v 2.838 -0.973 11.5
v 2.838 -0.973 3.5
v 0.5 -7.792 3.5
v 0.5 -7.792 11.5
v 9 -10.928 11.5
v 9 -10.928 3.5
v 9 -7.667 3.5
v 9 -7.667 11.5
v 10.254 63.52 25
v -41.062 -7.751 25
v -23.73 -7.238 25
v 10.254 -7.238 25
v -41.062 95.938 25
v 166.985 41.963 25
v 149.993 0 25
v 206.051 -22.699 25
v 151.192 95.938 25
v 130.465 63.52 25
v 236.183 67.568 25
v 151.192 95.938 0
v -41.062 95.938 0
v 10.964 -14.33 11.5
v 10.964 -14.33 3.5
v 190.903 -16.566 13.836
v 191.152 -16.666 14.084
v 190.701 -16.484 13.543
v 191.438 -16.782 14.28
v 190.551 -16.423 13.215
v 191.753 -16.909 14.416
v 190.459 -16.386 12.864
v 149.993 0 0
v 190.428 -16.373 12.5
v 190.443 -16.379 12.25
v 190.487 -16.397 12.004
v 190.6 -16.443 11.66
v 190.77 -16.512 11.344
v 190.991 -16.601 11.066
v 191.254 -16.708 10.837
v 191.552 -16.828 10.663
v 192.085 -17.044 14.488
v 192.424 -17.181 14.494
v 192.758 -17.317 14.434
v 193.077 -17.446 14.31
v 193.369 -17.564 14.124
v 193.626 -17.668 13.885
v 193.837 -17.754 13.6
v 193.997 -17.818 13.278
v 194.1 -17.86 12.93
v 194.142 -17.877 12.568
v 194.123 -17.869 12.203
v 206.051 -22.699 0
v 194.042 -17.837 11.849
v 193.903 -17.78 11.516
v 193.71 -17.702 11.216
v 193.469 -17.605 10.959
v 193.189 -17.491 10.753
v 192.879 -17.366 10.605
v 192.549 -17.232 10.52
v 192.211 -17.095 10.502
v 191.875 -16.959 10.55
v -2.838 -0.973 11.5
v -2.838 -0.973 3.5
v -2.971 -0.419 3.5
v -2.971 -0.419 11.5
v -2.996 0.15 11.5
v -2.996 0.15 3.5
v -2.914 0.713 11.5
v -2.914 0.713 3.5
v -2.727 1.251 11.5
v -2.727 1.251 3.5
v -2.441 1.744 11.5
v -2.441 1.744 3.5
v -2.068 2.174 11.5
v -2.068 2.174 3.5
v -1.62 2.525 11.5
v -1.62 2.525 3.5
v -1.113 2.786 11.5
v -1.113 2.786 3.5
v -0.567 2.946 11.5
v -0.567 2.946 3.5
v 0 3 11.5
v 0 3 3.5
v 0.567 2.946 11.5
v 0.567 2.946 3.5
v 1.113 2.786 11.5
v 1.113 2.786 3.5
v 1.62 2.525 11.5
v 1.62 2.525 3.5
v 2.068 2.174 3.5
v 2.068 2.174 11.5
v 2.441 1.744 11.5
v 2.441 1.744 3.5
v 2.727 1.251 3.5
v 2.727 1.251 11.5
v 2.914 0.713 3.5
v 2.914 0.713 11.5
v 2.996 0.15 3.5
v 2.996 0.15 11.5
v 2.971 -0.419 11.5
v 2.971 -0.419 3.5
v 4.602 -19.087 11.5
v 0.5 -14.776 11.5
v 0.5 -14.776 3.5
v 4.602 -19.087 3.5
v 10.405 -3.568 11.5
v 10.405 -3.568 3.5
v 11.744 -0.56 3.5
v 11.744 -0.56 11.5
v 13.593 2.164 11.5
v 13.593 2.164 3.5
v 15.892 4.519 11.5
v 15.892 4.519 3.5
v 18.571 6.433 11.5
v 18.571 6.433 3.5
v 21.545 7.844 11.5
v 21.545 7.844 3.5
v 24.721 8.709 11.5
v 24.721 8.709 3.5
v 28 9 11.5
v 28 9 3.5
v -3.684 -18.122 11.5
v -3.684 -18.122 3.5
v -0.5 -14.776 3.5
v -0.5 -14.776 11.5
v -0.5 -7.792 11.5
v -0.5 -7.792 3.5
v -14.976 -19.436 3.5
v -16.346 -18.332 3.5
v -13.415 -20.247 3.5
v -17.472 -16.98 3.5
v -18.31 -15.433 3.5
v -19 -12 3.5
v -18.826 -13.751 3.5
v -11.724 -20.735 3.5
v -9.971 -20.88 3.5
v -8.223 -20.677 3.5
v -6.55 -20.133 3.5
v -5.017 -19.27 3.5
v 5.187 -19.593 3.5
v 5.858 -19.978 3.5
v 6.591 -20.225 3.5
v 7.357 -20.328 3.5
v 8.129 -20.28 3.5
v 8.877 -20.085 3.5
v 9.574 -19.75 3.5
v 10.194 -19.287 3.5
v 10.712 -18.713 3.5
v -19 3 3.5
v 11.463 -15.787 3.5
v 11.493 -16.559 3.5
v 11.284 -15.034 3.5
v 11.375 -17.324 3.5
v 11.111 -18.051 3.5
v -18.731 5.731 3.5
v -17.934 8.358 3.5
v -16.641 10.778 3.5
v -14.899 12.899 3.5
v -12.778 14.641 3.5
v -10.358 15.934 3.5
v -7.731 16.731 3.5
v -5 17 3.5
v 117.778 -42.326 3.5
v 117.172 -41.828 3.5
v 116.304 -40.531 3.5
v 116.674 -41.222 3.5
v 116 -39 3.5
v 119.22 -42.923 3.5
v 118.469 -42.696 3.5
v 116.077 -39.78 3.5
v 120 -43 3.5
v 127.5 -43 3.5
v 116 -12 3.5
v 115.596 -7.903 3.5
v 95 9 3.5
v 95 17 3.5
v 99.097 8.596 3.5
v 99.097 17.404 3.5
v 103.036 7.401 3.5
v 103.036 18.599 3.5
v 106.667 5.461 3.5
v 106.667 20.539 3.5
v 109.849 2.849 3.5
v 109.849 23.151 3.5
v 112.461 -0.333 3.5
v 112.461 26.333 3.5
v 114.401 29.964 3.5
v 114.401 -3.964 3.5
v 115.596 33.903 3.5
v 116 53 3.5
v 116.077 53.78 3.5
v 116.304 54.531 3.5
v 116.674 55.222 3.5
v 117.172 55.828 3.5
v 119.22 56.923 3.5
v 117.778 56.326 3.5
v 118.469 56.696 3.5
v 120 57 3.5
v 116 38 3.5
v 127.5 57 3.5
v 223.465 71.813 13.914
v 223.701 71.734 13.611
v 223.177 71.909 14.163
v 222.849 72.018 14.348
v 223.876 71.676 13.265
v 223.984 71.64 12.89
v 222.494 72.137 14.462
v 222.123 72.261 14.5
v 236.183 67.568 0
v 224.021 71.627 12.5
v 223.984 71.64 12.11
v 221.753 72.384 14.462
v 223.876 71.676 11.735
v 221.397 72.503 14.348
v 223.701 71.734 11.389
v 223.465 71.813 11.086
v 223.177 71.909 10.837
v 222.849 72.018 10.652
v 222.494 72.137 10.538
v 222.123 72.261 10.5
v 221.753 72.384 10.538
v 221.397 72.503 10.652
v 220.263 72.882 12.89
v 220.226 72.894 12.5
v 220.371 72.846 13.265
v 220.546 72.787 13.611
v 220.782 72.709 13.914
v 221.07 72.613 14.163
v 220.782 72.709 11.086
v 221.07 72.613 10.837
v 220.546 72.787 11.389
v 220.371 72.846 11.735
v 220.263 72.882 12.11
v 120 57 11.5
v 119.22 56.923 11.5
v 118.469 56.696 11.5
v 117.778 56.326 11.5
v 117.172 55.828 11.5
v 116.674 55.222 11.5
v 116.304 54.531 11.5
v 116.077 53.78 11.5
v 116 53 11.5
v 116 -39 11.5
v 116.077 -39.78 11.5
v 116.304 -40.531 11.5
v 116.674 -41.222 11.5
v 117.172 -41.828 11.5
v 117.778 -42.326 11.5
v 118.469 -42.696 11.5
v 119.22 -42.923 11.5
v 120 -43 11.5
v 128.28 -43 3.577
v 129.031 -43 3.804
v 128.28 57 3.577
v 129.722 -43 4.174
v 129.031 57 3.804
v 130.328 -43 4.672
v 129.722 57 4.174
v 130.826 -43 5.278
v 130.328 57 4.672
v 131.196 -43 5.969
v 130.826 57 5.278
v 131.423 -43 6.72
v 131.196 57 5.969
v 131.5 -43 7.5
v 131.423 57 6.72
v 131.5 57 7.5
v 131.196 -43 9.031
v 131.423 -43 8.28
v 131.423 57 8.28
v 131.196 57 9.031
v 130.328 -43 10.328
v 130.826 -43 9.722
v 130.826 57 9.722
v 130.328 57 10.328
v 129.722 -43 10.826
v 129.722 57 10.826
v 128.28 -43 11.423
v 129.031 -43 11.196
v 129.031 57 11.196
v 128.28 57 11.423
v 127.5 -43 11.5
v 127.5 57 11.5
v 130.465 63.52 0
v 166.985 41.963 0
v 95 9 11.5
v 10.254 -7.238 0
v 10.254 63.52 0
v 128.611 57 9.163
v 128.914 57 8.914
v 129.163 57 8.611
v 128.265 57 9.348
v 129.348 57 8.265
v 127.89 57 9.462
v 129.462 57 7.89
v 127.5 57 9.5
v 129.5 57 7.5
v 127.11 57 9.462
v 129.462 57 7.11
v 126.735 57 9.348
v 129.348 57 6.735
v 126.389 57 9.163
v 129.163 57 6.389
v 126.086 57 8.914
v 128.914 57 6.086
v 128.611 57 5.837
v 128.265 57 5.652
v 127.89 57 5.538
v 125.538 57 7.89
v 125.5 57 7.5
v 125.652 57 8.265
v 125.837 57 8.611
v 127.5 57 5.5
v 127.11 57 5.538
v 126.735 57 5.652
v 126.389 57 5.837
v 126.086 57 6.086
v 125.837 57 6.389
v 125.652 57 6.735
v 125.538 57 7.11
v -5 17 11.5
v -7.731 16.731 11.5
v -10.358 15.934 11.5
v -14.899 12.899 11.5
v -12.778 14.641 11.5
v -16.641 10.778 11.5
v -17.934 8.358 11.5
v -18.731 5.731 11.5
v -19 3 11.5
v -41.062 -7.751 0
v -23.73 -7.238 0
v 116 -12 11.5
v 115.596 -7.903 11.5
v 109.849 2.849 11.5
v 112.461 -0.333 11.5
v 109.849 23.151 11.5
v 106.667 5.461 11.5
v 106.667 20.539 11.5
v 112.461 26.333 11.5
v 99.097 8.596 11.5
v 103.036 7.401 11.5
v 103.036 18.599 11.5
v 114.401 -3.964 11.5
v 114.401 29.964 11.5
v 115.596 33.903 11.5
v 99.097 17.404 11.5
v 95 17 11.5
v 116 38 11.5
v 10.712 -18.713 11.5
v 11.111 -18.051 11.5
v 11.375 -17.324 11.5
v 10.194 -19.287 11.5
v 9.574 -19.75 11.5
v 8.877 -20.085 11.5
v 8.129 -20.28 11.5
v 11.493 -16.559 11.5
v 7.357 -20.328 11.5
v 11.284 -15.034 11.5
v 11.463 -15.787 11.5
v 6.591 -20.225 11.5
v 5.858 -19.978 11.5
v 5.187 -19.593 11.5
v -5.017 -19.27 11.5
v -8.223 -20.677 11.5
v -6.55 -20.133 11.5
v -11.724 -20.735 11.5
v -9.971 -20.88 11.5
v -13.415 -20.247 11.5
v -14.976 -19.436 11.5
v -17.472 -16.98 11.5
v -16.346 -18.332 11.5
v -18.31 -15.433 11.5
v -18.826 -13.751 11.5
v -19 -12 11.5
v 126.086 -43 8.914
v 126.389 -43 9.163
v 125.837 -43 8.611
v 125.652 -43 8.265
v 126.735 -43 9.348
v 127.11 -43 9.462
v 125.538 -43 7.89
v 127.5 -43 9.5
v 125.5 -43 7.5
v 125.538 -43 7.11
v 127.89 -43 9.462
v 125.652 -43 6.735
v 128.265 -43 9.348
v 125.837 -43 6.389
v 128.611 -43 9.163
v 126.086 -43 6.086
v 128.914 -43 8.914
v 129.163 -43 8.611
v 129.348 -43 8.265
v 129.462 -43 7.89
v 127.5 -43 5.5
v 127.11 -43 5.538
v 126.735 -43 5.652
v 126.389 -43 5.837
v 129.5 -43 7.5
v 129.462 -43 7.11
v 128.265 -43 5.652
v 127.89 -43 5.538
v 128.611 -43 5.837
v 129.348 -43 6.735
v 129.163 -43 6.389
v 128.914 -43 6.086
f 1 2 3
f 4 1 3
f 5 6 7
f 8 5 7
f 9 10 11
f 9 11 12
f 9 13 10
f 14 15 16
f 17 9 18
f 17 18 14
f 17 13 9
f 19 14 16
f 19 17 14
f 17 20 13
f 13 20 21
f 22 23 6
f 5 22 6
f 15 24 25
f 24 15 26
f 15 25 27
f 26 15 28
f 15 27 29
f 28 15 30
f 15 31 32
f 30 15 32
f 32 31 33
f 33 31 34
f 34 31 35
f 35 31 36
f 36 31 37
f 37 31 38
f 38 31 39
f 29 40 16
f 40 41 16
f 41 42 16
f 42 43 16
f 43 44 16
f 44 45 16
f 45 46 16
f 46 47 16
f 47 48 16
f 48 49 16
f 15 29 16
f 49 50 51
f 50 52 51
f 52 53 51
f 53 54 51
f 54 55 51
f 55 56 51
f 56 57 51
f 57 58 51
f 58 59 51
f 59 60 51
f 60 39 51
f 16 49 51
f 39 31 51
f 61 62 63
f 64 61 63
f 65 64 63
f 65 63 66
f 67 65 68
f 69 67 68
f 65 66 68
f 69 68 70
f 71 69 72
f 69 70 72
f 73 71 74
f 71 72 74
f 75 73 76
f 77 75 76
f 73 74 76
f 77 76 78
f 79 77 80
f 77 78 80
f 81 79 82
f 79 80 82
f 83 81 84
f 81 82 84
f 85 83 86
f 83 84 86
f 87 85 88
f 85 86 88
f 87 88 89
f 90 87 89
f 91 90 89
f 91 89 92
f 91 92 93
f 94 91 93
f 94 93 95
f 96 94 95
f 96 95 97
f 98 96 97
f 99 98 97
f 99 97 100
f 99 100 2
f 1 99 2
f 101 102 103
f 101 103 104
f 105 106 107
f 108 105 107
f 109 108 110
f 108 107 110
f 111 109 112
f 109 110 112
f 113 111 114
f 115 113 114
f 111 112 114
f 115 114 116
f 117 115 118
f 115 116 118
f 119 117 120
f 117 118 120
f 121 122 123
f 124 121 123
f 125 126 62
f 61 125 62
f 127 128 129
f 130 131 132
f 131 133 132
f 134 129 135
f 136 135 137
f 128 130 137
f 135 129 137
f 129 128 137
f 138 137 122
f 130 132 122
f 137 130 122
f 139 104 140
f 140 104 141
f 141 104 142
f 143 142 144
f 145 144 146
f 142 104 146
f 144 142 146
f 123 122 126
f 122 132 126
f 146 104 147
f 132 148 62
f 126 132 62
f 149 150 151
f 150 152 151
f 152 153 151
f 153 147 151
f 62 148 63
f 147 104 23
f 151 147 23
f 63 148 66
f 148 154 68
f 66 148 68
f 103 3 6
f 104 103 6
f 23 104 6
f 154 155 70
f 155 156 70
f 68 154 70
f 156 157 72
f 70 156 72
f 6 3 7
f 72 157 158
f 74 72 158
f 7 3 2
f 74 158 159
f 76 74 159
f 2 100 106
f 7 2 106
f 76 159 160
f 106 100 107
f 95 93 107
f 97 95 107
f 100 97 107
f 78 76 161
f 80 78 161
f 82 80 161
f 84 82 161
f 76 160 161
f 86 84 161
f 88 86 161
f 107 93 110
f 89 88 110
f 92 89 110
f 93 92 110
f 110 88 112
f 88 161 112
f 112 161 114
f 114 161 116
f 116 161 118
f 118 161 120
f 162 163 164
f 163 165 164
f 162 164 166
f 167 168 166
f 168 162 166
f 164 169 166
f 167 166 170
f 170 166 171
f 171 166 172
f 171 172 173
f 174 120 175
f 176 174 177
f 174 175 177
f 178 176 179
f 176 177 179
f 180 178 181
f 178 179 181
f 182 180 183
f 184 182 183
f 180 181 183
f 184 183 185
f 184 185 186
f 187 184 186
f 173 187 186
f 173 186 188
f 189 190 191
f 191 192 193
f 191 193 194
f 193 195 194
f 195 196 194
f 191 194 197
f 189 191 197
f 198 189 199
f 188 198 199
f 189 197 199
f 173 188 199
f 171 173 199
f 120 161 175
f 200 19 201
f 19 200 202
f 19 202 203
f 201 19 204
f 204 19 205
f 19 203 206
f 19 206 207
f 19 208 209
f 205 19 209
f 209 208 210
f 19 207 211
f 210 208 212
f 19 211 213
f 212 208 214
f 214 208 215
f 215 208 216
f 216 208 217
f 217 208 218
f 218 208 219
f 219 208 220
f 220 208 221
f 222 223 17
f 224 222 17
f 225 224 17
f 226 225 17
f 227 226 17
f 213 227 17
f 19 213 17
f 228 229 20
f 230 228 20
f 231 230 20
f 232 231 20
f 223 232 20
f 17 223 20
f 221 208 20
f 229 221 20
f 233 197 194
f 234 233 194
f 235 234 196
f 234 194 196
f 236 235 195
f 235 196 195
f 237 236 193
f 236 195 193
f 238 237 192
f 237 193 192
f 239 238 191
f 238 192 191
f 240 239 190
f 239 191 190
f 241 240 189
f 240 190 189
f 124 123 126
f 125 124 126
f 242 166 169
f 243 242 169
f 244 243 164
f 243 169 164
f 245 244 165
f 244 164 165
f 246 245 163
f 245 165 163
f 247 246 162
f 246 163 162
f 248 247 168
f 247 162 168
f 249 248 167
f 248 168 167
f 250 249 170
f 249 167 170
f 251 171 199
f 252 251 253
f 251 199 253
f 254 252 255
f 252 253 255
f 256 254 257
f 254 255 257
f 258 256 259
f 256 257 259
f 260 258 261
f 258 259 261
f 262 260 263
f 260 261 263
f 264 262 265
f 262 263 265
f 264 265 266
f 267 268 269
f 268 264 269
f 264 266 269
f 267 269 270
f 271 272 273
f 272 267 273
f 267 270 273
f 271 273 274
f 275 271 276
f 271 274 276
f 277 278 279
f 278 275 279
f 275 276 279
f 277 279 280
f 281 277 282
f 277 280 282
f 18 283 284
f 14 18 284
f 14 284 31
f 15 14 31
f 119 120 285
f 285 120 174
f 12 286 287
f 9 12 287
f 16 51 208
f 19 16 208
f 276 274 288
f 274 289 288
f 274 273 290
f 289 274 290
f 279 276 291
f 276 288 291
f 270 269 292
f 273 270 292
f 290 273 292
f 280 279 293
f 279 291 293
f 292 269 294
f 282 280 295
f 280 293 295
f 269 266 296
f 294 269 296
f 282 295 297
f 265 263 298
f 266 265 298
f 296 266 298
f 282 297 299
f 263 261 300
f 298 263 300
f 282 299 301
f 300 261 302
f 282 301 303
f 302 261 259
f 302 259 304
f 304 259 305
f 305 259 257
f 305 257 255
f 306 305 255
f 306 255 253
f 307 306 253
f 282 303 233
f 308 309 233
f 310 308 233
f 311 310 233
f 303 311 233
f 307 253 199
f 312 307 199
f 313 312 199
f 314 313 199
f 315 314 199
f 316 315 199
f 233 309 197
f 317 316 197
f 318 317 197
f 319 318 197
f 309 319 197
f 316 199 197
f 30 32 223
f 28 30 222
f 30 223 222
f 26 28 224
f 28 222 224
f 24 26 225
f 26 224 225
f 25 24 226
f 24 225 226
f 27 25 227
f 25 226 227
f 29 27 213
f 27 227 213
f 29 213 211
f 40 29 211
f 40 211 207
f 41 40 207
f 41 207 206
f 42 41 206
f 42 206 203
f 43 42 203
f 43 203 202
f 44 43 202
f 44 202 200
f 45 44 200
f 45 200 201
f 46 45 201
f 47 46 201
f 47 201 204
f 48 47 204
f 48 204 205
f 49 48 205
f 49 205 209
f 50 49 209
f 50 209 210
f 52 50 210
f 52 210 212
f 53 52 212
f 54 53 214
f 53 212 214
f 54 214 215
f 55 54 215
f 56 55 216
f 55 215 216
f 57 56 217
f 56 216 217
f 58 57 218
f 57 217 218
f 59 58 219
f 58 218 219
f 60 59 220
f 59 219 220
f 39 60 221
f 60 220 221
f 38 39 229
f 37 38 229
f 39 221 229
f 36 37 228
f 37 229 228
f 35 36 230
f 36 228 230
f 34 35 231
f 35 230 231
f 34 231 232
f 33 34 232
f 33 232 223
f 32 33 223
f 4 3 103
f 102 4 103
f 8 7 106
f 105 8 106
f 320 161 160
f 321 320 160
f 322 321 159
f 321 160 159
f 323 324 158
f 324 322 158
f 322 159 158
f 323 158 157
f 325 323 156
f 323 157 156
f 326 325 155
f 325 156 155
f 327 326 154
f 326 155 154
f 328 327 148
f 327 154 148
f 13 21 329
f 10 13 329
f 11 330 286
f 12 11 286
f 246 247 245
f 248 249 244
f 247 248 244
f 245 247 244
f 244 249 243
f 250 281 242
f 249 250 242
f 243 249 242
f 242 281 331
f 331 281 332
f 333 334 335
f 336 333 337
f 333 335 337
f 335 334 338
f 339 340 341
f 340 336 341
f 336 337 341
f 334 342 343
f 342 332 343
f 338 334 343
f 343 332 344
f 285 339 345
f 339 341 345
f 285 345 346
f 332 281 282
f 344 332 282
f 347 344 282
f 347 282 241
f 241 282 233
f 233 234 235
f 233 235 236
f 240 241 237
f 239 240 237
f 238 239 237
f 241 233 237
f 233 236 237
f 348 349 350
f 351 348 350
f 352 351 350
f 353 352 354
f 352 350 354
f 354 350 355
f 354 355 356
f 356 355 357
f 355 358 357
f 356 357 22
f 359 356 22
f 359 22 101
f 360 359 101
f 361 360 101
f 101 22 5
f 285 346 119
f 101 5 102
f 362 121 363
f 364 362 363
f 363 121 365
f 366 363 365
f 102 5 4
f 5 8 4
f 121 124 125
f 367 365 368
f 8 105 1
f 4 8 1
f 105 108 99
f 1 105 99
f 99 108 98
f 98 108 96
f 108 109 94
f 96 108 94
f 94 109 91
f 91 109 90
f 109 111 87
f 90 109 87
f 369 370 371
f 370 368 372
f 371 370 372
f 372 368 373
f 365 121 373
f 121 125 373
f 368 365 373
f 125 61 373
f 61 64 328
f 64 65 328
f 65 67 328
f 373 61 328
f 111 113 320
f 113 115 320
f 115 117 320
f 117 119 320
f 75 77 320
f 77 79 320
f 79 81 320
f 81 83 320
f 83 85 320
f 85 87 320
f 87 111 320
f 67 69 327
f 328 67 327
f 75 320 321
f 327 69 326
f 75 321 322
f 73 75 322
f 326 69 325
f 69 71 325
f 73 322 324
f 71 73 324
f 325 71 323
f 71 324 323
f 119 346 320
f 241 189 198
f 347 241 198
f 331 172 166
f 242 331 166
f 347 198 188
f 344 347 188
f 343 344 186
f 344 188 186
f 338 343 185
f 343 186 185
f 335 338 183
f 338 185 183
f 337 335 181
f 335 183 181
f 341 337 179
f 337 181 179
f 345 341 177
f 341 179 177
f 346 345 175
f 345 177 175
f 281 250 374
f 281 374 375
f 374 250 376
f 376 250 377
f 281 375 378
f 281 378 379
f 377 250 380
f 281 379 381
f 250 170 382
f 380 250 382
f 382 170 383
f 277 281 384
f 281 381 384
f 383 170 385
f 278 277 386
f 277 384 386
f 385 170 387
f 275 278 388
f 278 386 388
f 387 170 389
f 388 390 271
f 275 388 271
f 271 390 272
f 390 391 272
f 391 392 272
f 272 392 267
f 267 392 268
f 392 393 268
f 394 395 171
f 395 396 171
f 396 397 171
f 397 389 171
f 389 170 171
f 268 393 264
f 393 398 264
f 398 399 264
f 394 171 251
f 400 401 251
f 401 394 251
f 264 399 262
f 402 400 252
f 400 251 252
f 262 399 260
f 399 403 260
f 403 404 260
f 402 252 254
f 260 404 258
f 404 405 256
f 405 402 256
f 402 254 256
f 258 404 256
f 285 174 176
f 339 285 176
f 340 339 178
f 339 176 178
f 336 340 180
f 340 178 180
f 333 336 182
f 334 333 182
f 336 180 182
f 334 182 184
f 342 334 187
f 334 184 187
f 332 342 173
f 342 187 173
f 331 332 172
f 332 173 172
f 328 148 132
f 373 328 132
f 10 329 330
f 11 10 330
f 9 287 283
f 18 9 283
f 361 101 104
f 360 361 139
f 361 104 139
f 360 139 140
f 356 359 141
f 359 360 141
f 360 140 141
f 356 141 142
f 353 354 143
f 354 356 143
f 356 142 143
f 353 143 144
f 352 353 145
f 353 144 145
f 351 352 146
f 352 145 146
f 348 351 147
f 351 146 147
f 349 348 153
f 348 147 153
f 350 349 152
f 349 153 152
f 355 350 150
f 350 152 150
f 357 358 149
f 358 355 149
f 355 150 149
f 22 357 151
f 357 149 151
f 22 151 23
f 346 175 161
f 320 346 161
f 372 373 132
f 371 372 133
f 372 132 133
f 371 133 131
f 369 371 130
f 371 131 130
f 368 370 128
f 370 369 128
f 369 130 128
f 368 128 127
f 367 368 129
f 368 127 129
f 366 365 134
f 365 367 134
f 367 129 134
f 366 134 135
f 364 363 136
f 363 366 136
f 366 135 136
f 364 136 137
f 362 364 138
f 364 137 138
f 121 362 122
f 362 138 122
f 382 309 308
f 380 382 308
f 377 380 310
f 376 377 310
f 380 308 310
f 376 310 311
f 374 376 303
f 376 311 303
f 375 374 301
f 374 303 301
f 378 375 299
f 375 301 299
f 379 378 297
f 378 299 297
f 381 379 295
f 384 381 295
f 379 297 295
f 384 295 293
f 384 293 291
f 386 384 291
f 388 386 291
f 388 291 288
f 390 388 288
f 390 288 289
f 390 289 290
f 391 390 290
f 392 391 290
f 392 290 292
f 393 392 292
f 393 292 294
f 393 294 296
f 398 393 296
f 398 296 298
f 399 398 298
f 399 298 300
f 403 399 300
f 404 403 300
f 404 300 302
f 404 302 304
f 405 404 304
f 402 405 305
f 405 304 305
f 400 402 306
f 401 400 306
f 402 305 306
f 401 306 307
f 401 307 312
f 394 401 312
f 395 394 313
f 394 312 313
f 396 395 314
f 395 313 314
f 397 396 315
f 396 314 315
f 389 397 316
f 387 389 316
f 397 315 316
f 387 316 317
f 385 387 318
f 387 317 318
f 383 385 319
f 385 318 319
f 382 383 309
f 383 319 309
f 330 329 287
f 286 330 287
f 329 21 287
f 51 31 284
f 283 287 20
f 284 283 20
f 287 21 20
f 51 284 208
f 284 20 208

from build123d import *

# Parameters (mm, degrees)
F3_DEPTH  = 25
F4_R      = 2
F5_REACH  = 179.0646776001
F7_DEPTH  = 15
F8_R      = 2
F9_DEPTH  = 100.001
F10_W     = 4
F10_H     = 3.5
F10_W_2   = 21
F10_W_3   = 100
F10_W_4   = 14
F11_DEPTH = 100.001


# Not quite as in the source:
# - the program builds the solid bodies; features that only make, move or delete a surface that nothing else refers to are left out


with BuildPart() as f3:
    # F2 (on Top) → F3 (new body)
    with BuildSketch(Plane.XY):
        Polygon((-41.0616472363, -7.7508748509), (-23.7303264439, -7.237566635), (10.2535411716, -7.237566635), (10.2535411716, 63.5198950768), (130.4651498795, 63.5198950768), (166.9851094484, 41.9629588723), (149.9931961298, 0), (206.0509233637, -22.6992582886), (236.1825853586, 67.5677359104), (151.1922137485, 95.9380297581), (-41.0616472363, 95.9380297581), align=None)
    extrude(amount=F3_DEPTH)

    f5_end = f3.faces().sort_by_distance((178.0220597468, -11.3496291443, 12.5))[0]
    # F4 (on face) → F5 (cut, up to a face of the model that its end follows)
    with BuildSketch(Plane(origin=(43.9718677966, 131.7288218617, 0), x_dir=(-0.9485487152, 0.3166312286, 0), z_dir=(0.3166312286, 0.9485487152, 0))):
        with Locations((-187.8149360418, 12.5)):
            Circle(F4_R)
    f5_long = extrude(amount=-F5_REACH, mode=Mode.PRIVATE)
    add(split(f5_long, bisect_by=f5_end, keep=Keep.BOTTOM, mode=Mode.PRIVATE), mode=Mode.SUBTRACT)


with BuildPart() as f7:
    # F6 (on Top) → F7 (new body)
    with BuildSketch(Plane.XY):
        with BuildLine():
            ThreePointArc((108.5646599662, 17), (106.9006209041, 16.0142040831), (105.1653529206, 15.16))
            ThreePointArc((105.1653529206, 15.16), (118.8306025385, 4.5258095914), (124, -12))
            Line((124, -12), (124, -39))
            ThreePointArc((124, -39), (122.8284271247, -41.8284271247), (120, -43))
            Line((120, -43), (135, -43))
            Line((135, -43), (135, 17))
            Line((135, 17), (124, 17))
            Line((124, 17), (108.5646599662, 17))
        make_face()
        with BuildLine():
            Line((-0.5, -7.7916666667), (-2.8378378378, -0.972972973))
            ThreePointArc((-2.8378378378, -0.972972973), (0, 3), (2.8378378378, -0.972972973))
            Line((2.8378378378, -0.972972973), (0.5, -7.7916666667))
            Line((0.5, -7.7916666667), (0.5, -14.7755569556))
            Line((0.5, -14.7755569556), (4.6019879687, -19.087213573))
            ThreePointArc((4.6019879687, -19.087213573), (9.8953251293, -19.5336278423), (10.9641016151, -14.3301270189))
            Line((10.9641016151, -14.3301270189), (9, -10.9282032303))
            Line((9, -10.9282032303), (9, -7.6666666667))
            Line((9, -7.6666666667), (10.4054054054, -3.5675675676))
            ThreePointArc((10.4054054054, -3.5675675676), (17.1889695968, 5.5354425644), (28, 9))
            Line((28, 9), (95, 9))
            ThreePointArc((95, 9), (109.8492424049, 2.8492424049), (116, -12))
            Line((116, -12), (116, -39))
            ThreePointArc((116, -39), (117.1715728753, -41.8284271247), (120, -43))
            ThreePointArc((120, -43), (122.8284271247, -41.8284271247), (124, -39))
            Line((124, -39), (124, -12))
            ThreePointArc((124, -12), (118.8306025385, 4.5258095914), (105.1653529206, 15.16))
            ThreePointArc((105.1653529206, 15.16), (100.1652686281, 16.5362926814), (95, 17))
            Line((95, 17), (-5, 17))
            ThreePointArc((-5, 17), (-14.8994949366, 12.8994949366), (-19, 3))
            Line((-19, 3), (-19, -12))
            ThreePointArc((-19, -12), (-13.4147336478, -20.247270588), (-3.6835816648, -18.1218639308))
            Line((-3.6835816648, -18.1218639308), (-0.5, -14.7755569556))
            Line((-0.5, -14.7755569556), (-0.5, -7.7916666667))
        make_face()
        with BuildLine():
            ThreePointArc((116, 38), (109.8492424049, 23.1507575951), (95, 17))
            Line((95, 17), (108.5646599662, 17))
            Line((108.5646599662, 17), (124, 17))
            Line((124, 17), (135, 17))
            Line((135, 17), (135, 57))
            Line((135, 57), (120, 57))
            ThreePointArc((120, 57), (117.1715728753, 55.8284271247), (116, 53))
            Line((116, 53), (116, 38))
        make_face()
        with BuildLine():
            Line((108.5646599662, 17), (95, 17))
            ThreePointArc((95, 17), (100.1652686281, 16.5362926814), (105.1653529206, 15.16))
            ThreePointArc((105.1653529206, 15.16), (106.9006209041, 16.0142040831), (108.5646599662, 17))
        make_face()
    extrude(amount=F7_DEPTH)

    # F8 (on face) → F9 (cut, through all)
    with BuildSketch(Plane(origin=(0, 57, 0), x_dir=(-1, 0, 0), z_dir=(0, 1, 0))):
        with Locations((-127.5, 7.5)):
            Circle(F8_R)
    extrude(amount=-F9_DEPTH, mode=Mode.SUBTRACT)

    # F10 (on face) → F11 (cut, through all)
    with BuildSketch(Plane(origin=(0, 57, 0), x_dir=(-1, 0, 0), z_dir=(0, 1, 0))):
        with BuildLine():
            ThreePointArc((-127.5, 3.5), (-131.5, 7.5), (-127.5, 11.5))
            Line((-127.5, 11.5), (-120, 11.5))
            Line((-120, 11.5), (-120, 15))
            Line((-120, 15), (-135, 15))
            Line((-135, 15), (-135, 0))
            Line((-135, 0), (-120, 0))
            Line((-120, 0), (-120, 3.5))
            Line((-120, 3.5), (-127.5, 3.5))
        make_face()
        with Locations((-118, 13.25)):
            Rectangle(F10_W, F10_H)
        with Locations((-105.5, 13.25)):
            Rectangle(F10_W_2, F10_H)
        with Locations((-118, 1.75)):
            Rectangle(F10_W, F10_H)
        with Locations((-105.5, 1.75)):
            Rectangle(F10_W_2, F10_H)
        with Locations((-45, 1.75)):
            Rectangle(F10_W_3, F10_H)
        with Locations((-45, 13.25)):
            Rectangle(F10_W_3, F10_H)
        with Locations((12, 13.25)):
            Rectangle(F10_W_4, F10_H)
        with Locations((12, 1.75)):
            Rectangle(F10_W_4, F10_H)
    extrude(amount=-F11_DEPTH, mode=Mode.SUBTRACT)


solid = Compound([f3.part, f7.part])
